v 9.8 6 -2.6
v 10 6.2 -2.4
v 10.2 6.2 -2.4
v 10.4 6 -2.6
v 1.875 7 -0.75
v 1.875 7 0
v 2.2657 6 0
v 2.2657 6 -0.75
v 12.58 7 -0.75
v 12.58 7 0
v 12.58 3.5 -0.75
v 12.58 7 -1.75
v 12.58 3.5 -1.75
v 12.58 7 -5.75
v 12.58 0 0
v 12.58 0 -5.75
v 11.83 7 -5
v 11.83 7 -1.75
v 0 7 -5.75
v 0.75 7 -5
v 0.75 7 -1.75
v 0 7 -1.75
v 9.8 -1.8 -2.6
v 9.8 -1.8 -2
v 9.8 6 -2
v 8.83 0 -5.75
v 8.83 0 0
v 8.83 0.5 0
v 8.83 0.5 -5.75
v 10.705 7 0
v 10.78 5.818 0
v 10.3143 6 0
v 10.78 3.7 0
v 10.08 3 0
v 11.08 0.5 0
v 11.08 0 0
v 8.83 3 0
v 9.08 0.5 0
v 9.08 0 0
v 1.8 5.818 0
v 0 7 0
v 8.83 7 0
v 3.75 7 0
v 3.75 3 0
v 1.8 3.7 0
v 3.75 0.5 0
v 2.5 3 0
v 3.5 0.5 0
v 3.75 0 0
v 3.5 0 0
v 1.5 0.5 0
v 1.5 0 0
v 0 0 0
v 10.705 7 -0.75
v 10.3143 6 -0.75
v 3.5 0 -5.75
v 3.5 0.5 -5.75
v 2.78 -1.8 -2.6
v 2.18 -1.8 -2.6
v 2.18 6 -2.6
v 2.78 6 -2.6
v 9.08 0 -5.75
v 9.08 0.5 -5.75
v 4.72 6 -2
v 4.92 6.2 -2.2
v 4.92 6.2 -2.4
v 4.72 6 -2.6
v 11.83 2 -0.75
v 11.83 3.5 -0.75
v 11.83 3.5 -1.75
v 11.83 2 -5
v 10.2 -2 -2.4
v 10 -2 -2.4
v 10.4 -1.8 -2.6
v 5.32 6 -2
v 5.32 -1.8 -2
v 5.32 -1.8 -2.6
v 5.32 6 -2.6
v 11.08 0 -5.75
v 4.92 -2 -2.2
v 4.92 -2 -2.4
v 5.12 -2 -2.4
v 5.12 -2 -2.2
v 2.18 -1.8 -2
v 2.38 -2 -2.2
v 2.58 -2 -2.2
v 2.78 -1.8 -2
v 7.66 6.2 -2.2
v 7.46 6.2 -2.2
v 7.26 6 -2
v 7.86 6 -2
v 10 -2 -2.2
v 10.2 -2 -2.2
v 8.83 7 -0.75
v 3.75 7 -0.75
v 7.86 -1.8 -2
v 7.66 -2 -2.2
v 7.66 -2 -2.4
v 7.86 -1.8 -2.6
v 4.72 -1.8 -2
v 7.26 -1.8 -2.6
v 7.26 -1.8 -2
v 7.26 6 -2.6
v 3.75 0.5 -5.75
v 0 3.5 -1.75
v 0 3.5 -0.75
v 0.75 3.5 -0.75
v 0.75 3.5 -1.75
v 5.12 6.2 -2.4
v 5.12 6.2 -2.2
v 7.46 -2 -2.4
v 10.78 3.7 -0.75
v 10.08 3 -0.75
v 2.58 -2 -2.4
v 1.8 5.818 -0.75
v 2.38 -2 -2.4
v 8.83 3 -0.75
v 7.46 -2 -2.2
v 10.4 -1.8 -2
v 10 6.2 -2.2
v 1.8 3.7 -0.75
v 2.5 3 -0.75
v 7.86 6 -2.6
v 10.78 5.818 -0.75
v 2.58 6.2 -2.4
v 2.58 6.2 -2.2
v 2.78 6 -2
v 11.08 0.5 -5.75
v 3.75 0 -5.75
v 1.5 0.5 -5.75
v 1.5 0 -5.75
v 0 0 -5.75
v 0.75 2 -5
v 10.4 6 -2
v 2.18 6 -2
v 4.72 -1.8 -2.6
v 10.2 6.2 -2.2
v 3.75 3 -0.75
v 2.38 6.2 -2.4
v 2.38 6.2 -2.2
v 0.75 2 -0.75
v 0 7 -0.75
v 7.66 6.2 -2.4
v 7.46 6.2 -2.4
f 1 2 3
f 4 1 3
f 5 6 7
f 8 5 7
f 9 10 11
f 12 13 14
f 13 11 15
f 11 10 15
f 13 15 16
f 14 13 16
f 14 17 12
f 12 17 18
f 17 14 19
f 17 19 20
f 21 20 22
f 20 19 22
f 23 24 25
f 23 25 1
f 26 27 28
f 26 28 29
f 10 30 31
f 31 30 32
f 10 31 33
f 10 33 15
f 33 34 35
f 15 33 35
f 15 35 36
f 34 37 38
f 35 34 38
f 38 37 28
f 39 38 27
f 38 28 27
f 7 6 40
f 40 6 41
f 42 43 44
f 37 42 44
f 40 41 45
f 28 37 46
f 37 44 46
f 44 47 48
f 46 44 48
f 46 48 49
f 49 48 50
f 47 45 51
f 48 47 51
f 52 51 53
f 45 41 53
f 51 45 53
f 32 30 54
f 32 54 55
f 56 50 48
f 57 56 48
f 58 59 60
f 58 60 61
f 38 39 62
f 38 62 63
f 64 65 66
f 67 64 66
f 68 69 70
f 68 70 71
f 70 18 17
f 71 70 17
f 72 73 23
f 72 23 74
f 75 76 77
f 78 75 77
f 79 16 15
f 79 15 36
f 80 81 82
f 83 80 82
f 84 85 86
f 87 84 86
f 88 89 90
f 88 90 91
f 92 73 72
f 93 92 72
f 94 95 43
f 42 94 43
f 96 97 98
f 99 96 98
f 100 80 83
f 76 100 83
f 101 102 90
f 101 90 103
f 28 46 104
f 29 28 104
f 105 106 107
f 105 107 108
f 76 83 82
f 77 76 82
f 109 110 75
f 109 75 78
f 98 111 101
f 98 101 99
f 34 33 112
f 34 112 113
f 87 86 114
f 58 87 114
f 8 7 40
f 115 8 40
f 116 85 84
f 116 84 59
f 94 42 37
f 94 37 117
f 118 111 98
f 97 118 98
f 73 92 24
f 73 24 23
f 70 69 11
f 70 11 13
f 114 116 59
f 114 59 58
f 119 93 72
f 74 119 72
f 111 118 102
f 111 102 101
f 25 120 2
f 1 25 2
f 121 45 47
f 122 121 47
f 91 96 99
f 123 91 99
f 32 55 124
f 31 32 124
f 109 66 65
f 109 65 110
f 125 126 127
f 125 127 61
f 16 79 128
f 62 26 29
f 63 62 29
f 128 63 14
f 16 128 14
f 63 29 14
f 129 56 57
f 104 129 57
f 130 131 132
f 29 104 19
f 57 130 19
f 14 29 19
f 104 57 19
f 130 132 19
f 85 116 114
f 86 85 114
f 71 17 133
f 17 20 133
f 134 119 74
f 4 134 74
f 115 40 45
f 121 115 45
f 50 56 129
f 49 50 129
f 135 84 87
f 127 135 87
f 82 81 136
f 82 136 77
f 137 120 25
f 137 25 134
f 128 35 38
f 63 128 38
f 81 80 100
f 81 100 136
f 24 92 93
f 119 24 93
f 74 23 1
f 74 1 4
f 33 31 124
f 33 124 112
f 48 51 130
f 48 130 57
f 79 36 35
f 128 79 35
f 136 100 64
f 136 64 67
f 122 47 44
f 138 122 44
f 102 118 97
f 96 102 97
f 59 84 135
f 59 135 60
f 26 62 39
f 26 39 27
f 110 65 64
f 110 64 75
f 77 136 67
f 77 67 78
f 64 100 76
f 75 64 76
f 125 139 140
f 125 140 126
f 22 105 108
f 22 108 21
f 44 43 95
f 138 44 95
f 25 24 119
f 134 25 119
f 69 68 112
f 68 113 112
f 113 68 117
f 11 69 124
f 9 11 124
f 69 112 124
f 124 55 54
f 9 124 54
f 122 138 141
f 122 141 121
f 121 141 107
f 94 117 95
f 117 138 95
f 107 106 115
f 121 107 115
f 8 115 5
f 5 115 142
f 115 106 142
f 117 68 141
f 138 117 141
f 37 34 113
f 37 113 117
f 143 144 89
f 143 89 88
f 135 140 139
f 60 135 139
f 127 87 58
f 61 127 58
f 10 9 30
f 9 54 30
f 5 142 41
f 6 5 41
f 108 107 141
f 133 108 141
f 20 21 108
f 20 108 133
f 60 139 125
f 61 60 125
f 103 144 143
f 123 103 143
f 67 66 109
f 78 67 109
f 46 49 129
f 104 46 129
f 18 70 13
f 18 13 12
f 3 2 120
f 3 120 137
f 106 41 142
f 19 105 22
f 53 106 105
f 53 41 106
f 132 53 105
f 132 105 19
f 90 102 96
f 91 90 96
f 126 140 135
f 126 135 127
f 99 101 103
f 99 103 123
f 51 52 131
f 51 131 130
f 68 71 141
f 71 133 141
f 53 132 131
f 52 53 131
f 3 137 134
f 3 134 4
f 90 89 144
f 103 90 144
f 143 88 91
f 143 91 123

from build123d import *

# Parameters (mm, degrees)
SKETCH1_W           = 3.75
SKETCH1_H           = 5.75
BOSS_EXTRUDE1_DEPTH = 7
CUT_EXTRUDE1_DEPTH  = 5
SKETCH4_W           = 2
SKETCH4_H           = 0.5
CUT_EXTRUDE2_DEPTH  = 10.804335776
CUT_EXTRUDE3_REACH  = 11.804
BOSS_EXTRUDE2_START = -4
SKETCH6_W           = 0.6
SKETCH6_H           = 0.6
BOSS_EXTRUDE2_DEPTH = 8.2
CHAMFER1_SIZE       = 0.2
LPATTERN3_COUNT     = 4
LPATTERN3_PITCH     = 2.54
CHAMFER2_SIZE       = 0.2
CHAMFER3_SIZE       = 0.2
CHAMFER4_SIZE       = 0.2
BOSS_EXTRUDE4_DEPTH = 5.08
SKETCH7_W           = 1
SKETCH7_H           = 3.5
CUT_EXTRUDE4_DEPTH  = 16.502222421


with BuildPart() as part:
    # Sketch1 → Boss-Extrude1 (new body)
    with BuildSketch(Plane(origin=(0, 0, 0), x_dir=(1, 0, 0), z_dir=(0, 1, 0))):
        with Locations((1.875, 2.875)):
            Rectangle(SKETCH1_W, SKETCH1_H)
    extrude(amount=BOSS_EXTRUDE1_DEPTH)

    # Sketch2 → Cut-Extrude1 (cut)
    with BuildSketch(Plane(origin=(0, 7, 0), x_dir=(1, 0, 0), z_dir=(0, 1, 0))):
        Polygon((3, 5), (3.75, 5), (3.75, 0.75), (3, 0.75), (0.75, 0.75), (0.75, 5), align=None)
    extrude(amount=-CUT_EXTRUDE1_DEPTH, mode=Mode.SUBTRACT)

    # Sketch4 → Cut-Extrude2 (cut, through all)
    with BuildSketch(Plane.XY):
        with Locations((2.5, 0.25)):
            Rectangle(SKETCH4_W, SKETCH4_H)
    extrude(amount=-CUT_EXTRUDE2_DEPTH, mode=Mode.SUBTRACT)

    # Sketch5 → Cut-Extrude3 (cut, up to next)
    with BuildSketch(Plane.XY, mode=Mode.PRIVATE) as cut_extrude3_sk1:
        Polygon((1.8, 3.7), (2.5, 3), (3.75, 3), (3.75, 7), (1.875, 7), (2.265714541, 6), (1.8, 5.818038557), align=None)
    cut_extrude3_tool1 = extrude(cut_extrude3_sk1.sketch, amount=-CUT_EXTRUDE3_REACH, mode=Mode.PRIVATE) & part.part
    add(cut_extrude3_tool1.solids().sort_by_distance((2.835359, 5.002769, 0))[0], mode=Mode.SUBTRACT)


with BuildPart() as body_2:
    # Sketch6 → Boss-Extrude2 (new body)
    with BuildSketch(Plane(origin=(0, 2, 0), x_dir=(1, 0, 0), z_dir=(0, 1, 0)).offset(BOSS_EXTRUDE2_START)):
        with Locations((2.48, 2.3)):
            Rectangle(SKETCH6_W, SKETCH6_H)
    boss_extrude2 = extrude(amount=BOSS_EXTRUDE2_DEPTH)

    # Chamfer1
    chamfer1_edges = [body_2.edges().sort_by_distance(p)[0] for p in [
        (2.48, -2, -2.6),
        (2.78, -2, -2.3),
        (2.48, -2, -2),
        (2.48, 6.2, -2.6),
        (2.18, 6.2, -2.3),
        (2.48, 6.2, -2),
        (2.78, 6.2, -2.3),
        (2.18, -2, -2.3),
    ]]
    chamfer(chamfer1_edges, length=CHAMFER1_SIZE)


with BuildPart() as lpattern3_1:
    # LPattern3: pattern copy
    add(boss_extrude2.moved(Location(Vector(1, 0, 0) * (1 * LPATTERN3_PITCH))))

    # Chamfer2
    chamfer2_edges = [lpattern3_1.edges().sort_by_distance(p)[0] for p in [
        (5.02, -2, -2.6),
        (5.32, -2, -2.3),
        (5.02, -2, -2),
        (5.02, 6.2, -2.6),
        (4.72, 6.2, -2.3),
        (5.02, 6.2, -2),
        (5.32, 6.2, -2.3),
        (4.72, -2, -2.3),
    ]]
    chamfer(chamfer2_edges, length=CHAMFER2_SIZE)


with BuildPart() as lpattern3_2:
    # LPattern3: pattern copy
    add(boss_extrude2.moved(Location(Vector(1, 0, 0) * (2 * LPATTERN3_PITCH))))

    # Chamfer3
    chamfer3_edges = [lpattern3_2.edges().sort_by_distance(p)[0] for p in [
        (7.56, -2, -2.6),
        (7.86, -2, -2.3),
        (7.56, -2, -2),
        (7.56, 6.2, -2.6),
        (7.26, 6.2, -2.3),
        (7.56, 6.2, -2),
        (7.86, 6.2, -2.3),
        (7.26, -2, -2.3),
    ]]
    chamfer(chamfer3_edges, length=CHAMFER3_SIZE)


with BuildPart() as lpattern3_3:
    # LPattern3: pattern copy
    add(boss_extrude2.moved(Location(Vector(1, 0, 0) * (3 * LPATTERN3_PITCH))))

    # Chamfer4
    chamfer4_edges = [lpattern3_3.edges().sort_by_distance(p)[0] for p in [
        (10.1, -2, -2.6),
        (10.4, -2, -2.3),
        (10.1, -2, -2),
        (10.1, 6.2, -2.6),
        (9.8, 6.2, -2.3),
        (10.1, 6.2, -2),
        (10.4, 6.2, -2.3),
        (9.8, -2, -2.3),
    ]]
    chamfer(chamfer4_edges, length=CHAMFER4_SIZE)


with BuildPart() as body_6:
    # Mirror4: mirrored copy
    add(part.part.mirror(Plane(origin=(6.29, 0, 0), x_dir=(0, 0, 1), z_dir=(1, 0, 0))))


with BuildPart() as part_1:
    add(part.part)

    add(body_6.part)  # Boss-Extrude4 merges body 6
    # Sketch8<2> → Boss-Extrude4 (add)
    with BuildSketch(Plane(origin=(3.75, 0, 0), x_dir=(0, 0, -1), z_dir=(1, 0, 0))):
        Polygon((0, 0.5), (5.75, 0.5), (5.75, 7), (5, 7), (5, 2), (0.75, 2), (0.75, 7), (0, 7), align=None)
    extrude(amount=BOSS_EXTRUDE4_DEPTH)

    # Sketch7 → Cut-Extrude4 (cut, through all)
    with BuildSketch(Plane(origin=(0, 0, 0), x_dir=(0, 0, -1), z_dir=(1, 0, 0))):
        with Locations((1.25, 5.25)):
            Rectangle(SKETCH7_W, SKETCH7_H)
    extrude(amount=CUT_EXTRUDE4_DEPTH, mode=Mode.SUBTRACT)


solid = Compound([body_2.part, lpattern3_1.part, lpattern3_2.part, lpattern3_3.part, part_1.part])
